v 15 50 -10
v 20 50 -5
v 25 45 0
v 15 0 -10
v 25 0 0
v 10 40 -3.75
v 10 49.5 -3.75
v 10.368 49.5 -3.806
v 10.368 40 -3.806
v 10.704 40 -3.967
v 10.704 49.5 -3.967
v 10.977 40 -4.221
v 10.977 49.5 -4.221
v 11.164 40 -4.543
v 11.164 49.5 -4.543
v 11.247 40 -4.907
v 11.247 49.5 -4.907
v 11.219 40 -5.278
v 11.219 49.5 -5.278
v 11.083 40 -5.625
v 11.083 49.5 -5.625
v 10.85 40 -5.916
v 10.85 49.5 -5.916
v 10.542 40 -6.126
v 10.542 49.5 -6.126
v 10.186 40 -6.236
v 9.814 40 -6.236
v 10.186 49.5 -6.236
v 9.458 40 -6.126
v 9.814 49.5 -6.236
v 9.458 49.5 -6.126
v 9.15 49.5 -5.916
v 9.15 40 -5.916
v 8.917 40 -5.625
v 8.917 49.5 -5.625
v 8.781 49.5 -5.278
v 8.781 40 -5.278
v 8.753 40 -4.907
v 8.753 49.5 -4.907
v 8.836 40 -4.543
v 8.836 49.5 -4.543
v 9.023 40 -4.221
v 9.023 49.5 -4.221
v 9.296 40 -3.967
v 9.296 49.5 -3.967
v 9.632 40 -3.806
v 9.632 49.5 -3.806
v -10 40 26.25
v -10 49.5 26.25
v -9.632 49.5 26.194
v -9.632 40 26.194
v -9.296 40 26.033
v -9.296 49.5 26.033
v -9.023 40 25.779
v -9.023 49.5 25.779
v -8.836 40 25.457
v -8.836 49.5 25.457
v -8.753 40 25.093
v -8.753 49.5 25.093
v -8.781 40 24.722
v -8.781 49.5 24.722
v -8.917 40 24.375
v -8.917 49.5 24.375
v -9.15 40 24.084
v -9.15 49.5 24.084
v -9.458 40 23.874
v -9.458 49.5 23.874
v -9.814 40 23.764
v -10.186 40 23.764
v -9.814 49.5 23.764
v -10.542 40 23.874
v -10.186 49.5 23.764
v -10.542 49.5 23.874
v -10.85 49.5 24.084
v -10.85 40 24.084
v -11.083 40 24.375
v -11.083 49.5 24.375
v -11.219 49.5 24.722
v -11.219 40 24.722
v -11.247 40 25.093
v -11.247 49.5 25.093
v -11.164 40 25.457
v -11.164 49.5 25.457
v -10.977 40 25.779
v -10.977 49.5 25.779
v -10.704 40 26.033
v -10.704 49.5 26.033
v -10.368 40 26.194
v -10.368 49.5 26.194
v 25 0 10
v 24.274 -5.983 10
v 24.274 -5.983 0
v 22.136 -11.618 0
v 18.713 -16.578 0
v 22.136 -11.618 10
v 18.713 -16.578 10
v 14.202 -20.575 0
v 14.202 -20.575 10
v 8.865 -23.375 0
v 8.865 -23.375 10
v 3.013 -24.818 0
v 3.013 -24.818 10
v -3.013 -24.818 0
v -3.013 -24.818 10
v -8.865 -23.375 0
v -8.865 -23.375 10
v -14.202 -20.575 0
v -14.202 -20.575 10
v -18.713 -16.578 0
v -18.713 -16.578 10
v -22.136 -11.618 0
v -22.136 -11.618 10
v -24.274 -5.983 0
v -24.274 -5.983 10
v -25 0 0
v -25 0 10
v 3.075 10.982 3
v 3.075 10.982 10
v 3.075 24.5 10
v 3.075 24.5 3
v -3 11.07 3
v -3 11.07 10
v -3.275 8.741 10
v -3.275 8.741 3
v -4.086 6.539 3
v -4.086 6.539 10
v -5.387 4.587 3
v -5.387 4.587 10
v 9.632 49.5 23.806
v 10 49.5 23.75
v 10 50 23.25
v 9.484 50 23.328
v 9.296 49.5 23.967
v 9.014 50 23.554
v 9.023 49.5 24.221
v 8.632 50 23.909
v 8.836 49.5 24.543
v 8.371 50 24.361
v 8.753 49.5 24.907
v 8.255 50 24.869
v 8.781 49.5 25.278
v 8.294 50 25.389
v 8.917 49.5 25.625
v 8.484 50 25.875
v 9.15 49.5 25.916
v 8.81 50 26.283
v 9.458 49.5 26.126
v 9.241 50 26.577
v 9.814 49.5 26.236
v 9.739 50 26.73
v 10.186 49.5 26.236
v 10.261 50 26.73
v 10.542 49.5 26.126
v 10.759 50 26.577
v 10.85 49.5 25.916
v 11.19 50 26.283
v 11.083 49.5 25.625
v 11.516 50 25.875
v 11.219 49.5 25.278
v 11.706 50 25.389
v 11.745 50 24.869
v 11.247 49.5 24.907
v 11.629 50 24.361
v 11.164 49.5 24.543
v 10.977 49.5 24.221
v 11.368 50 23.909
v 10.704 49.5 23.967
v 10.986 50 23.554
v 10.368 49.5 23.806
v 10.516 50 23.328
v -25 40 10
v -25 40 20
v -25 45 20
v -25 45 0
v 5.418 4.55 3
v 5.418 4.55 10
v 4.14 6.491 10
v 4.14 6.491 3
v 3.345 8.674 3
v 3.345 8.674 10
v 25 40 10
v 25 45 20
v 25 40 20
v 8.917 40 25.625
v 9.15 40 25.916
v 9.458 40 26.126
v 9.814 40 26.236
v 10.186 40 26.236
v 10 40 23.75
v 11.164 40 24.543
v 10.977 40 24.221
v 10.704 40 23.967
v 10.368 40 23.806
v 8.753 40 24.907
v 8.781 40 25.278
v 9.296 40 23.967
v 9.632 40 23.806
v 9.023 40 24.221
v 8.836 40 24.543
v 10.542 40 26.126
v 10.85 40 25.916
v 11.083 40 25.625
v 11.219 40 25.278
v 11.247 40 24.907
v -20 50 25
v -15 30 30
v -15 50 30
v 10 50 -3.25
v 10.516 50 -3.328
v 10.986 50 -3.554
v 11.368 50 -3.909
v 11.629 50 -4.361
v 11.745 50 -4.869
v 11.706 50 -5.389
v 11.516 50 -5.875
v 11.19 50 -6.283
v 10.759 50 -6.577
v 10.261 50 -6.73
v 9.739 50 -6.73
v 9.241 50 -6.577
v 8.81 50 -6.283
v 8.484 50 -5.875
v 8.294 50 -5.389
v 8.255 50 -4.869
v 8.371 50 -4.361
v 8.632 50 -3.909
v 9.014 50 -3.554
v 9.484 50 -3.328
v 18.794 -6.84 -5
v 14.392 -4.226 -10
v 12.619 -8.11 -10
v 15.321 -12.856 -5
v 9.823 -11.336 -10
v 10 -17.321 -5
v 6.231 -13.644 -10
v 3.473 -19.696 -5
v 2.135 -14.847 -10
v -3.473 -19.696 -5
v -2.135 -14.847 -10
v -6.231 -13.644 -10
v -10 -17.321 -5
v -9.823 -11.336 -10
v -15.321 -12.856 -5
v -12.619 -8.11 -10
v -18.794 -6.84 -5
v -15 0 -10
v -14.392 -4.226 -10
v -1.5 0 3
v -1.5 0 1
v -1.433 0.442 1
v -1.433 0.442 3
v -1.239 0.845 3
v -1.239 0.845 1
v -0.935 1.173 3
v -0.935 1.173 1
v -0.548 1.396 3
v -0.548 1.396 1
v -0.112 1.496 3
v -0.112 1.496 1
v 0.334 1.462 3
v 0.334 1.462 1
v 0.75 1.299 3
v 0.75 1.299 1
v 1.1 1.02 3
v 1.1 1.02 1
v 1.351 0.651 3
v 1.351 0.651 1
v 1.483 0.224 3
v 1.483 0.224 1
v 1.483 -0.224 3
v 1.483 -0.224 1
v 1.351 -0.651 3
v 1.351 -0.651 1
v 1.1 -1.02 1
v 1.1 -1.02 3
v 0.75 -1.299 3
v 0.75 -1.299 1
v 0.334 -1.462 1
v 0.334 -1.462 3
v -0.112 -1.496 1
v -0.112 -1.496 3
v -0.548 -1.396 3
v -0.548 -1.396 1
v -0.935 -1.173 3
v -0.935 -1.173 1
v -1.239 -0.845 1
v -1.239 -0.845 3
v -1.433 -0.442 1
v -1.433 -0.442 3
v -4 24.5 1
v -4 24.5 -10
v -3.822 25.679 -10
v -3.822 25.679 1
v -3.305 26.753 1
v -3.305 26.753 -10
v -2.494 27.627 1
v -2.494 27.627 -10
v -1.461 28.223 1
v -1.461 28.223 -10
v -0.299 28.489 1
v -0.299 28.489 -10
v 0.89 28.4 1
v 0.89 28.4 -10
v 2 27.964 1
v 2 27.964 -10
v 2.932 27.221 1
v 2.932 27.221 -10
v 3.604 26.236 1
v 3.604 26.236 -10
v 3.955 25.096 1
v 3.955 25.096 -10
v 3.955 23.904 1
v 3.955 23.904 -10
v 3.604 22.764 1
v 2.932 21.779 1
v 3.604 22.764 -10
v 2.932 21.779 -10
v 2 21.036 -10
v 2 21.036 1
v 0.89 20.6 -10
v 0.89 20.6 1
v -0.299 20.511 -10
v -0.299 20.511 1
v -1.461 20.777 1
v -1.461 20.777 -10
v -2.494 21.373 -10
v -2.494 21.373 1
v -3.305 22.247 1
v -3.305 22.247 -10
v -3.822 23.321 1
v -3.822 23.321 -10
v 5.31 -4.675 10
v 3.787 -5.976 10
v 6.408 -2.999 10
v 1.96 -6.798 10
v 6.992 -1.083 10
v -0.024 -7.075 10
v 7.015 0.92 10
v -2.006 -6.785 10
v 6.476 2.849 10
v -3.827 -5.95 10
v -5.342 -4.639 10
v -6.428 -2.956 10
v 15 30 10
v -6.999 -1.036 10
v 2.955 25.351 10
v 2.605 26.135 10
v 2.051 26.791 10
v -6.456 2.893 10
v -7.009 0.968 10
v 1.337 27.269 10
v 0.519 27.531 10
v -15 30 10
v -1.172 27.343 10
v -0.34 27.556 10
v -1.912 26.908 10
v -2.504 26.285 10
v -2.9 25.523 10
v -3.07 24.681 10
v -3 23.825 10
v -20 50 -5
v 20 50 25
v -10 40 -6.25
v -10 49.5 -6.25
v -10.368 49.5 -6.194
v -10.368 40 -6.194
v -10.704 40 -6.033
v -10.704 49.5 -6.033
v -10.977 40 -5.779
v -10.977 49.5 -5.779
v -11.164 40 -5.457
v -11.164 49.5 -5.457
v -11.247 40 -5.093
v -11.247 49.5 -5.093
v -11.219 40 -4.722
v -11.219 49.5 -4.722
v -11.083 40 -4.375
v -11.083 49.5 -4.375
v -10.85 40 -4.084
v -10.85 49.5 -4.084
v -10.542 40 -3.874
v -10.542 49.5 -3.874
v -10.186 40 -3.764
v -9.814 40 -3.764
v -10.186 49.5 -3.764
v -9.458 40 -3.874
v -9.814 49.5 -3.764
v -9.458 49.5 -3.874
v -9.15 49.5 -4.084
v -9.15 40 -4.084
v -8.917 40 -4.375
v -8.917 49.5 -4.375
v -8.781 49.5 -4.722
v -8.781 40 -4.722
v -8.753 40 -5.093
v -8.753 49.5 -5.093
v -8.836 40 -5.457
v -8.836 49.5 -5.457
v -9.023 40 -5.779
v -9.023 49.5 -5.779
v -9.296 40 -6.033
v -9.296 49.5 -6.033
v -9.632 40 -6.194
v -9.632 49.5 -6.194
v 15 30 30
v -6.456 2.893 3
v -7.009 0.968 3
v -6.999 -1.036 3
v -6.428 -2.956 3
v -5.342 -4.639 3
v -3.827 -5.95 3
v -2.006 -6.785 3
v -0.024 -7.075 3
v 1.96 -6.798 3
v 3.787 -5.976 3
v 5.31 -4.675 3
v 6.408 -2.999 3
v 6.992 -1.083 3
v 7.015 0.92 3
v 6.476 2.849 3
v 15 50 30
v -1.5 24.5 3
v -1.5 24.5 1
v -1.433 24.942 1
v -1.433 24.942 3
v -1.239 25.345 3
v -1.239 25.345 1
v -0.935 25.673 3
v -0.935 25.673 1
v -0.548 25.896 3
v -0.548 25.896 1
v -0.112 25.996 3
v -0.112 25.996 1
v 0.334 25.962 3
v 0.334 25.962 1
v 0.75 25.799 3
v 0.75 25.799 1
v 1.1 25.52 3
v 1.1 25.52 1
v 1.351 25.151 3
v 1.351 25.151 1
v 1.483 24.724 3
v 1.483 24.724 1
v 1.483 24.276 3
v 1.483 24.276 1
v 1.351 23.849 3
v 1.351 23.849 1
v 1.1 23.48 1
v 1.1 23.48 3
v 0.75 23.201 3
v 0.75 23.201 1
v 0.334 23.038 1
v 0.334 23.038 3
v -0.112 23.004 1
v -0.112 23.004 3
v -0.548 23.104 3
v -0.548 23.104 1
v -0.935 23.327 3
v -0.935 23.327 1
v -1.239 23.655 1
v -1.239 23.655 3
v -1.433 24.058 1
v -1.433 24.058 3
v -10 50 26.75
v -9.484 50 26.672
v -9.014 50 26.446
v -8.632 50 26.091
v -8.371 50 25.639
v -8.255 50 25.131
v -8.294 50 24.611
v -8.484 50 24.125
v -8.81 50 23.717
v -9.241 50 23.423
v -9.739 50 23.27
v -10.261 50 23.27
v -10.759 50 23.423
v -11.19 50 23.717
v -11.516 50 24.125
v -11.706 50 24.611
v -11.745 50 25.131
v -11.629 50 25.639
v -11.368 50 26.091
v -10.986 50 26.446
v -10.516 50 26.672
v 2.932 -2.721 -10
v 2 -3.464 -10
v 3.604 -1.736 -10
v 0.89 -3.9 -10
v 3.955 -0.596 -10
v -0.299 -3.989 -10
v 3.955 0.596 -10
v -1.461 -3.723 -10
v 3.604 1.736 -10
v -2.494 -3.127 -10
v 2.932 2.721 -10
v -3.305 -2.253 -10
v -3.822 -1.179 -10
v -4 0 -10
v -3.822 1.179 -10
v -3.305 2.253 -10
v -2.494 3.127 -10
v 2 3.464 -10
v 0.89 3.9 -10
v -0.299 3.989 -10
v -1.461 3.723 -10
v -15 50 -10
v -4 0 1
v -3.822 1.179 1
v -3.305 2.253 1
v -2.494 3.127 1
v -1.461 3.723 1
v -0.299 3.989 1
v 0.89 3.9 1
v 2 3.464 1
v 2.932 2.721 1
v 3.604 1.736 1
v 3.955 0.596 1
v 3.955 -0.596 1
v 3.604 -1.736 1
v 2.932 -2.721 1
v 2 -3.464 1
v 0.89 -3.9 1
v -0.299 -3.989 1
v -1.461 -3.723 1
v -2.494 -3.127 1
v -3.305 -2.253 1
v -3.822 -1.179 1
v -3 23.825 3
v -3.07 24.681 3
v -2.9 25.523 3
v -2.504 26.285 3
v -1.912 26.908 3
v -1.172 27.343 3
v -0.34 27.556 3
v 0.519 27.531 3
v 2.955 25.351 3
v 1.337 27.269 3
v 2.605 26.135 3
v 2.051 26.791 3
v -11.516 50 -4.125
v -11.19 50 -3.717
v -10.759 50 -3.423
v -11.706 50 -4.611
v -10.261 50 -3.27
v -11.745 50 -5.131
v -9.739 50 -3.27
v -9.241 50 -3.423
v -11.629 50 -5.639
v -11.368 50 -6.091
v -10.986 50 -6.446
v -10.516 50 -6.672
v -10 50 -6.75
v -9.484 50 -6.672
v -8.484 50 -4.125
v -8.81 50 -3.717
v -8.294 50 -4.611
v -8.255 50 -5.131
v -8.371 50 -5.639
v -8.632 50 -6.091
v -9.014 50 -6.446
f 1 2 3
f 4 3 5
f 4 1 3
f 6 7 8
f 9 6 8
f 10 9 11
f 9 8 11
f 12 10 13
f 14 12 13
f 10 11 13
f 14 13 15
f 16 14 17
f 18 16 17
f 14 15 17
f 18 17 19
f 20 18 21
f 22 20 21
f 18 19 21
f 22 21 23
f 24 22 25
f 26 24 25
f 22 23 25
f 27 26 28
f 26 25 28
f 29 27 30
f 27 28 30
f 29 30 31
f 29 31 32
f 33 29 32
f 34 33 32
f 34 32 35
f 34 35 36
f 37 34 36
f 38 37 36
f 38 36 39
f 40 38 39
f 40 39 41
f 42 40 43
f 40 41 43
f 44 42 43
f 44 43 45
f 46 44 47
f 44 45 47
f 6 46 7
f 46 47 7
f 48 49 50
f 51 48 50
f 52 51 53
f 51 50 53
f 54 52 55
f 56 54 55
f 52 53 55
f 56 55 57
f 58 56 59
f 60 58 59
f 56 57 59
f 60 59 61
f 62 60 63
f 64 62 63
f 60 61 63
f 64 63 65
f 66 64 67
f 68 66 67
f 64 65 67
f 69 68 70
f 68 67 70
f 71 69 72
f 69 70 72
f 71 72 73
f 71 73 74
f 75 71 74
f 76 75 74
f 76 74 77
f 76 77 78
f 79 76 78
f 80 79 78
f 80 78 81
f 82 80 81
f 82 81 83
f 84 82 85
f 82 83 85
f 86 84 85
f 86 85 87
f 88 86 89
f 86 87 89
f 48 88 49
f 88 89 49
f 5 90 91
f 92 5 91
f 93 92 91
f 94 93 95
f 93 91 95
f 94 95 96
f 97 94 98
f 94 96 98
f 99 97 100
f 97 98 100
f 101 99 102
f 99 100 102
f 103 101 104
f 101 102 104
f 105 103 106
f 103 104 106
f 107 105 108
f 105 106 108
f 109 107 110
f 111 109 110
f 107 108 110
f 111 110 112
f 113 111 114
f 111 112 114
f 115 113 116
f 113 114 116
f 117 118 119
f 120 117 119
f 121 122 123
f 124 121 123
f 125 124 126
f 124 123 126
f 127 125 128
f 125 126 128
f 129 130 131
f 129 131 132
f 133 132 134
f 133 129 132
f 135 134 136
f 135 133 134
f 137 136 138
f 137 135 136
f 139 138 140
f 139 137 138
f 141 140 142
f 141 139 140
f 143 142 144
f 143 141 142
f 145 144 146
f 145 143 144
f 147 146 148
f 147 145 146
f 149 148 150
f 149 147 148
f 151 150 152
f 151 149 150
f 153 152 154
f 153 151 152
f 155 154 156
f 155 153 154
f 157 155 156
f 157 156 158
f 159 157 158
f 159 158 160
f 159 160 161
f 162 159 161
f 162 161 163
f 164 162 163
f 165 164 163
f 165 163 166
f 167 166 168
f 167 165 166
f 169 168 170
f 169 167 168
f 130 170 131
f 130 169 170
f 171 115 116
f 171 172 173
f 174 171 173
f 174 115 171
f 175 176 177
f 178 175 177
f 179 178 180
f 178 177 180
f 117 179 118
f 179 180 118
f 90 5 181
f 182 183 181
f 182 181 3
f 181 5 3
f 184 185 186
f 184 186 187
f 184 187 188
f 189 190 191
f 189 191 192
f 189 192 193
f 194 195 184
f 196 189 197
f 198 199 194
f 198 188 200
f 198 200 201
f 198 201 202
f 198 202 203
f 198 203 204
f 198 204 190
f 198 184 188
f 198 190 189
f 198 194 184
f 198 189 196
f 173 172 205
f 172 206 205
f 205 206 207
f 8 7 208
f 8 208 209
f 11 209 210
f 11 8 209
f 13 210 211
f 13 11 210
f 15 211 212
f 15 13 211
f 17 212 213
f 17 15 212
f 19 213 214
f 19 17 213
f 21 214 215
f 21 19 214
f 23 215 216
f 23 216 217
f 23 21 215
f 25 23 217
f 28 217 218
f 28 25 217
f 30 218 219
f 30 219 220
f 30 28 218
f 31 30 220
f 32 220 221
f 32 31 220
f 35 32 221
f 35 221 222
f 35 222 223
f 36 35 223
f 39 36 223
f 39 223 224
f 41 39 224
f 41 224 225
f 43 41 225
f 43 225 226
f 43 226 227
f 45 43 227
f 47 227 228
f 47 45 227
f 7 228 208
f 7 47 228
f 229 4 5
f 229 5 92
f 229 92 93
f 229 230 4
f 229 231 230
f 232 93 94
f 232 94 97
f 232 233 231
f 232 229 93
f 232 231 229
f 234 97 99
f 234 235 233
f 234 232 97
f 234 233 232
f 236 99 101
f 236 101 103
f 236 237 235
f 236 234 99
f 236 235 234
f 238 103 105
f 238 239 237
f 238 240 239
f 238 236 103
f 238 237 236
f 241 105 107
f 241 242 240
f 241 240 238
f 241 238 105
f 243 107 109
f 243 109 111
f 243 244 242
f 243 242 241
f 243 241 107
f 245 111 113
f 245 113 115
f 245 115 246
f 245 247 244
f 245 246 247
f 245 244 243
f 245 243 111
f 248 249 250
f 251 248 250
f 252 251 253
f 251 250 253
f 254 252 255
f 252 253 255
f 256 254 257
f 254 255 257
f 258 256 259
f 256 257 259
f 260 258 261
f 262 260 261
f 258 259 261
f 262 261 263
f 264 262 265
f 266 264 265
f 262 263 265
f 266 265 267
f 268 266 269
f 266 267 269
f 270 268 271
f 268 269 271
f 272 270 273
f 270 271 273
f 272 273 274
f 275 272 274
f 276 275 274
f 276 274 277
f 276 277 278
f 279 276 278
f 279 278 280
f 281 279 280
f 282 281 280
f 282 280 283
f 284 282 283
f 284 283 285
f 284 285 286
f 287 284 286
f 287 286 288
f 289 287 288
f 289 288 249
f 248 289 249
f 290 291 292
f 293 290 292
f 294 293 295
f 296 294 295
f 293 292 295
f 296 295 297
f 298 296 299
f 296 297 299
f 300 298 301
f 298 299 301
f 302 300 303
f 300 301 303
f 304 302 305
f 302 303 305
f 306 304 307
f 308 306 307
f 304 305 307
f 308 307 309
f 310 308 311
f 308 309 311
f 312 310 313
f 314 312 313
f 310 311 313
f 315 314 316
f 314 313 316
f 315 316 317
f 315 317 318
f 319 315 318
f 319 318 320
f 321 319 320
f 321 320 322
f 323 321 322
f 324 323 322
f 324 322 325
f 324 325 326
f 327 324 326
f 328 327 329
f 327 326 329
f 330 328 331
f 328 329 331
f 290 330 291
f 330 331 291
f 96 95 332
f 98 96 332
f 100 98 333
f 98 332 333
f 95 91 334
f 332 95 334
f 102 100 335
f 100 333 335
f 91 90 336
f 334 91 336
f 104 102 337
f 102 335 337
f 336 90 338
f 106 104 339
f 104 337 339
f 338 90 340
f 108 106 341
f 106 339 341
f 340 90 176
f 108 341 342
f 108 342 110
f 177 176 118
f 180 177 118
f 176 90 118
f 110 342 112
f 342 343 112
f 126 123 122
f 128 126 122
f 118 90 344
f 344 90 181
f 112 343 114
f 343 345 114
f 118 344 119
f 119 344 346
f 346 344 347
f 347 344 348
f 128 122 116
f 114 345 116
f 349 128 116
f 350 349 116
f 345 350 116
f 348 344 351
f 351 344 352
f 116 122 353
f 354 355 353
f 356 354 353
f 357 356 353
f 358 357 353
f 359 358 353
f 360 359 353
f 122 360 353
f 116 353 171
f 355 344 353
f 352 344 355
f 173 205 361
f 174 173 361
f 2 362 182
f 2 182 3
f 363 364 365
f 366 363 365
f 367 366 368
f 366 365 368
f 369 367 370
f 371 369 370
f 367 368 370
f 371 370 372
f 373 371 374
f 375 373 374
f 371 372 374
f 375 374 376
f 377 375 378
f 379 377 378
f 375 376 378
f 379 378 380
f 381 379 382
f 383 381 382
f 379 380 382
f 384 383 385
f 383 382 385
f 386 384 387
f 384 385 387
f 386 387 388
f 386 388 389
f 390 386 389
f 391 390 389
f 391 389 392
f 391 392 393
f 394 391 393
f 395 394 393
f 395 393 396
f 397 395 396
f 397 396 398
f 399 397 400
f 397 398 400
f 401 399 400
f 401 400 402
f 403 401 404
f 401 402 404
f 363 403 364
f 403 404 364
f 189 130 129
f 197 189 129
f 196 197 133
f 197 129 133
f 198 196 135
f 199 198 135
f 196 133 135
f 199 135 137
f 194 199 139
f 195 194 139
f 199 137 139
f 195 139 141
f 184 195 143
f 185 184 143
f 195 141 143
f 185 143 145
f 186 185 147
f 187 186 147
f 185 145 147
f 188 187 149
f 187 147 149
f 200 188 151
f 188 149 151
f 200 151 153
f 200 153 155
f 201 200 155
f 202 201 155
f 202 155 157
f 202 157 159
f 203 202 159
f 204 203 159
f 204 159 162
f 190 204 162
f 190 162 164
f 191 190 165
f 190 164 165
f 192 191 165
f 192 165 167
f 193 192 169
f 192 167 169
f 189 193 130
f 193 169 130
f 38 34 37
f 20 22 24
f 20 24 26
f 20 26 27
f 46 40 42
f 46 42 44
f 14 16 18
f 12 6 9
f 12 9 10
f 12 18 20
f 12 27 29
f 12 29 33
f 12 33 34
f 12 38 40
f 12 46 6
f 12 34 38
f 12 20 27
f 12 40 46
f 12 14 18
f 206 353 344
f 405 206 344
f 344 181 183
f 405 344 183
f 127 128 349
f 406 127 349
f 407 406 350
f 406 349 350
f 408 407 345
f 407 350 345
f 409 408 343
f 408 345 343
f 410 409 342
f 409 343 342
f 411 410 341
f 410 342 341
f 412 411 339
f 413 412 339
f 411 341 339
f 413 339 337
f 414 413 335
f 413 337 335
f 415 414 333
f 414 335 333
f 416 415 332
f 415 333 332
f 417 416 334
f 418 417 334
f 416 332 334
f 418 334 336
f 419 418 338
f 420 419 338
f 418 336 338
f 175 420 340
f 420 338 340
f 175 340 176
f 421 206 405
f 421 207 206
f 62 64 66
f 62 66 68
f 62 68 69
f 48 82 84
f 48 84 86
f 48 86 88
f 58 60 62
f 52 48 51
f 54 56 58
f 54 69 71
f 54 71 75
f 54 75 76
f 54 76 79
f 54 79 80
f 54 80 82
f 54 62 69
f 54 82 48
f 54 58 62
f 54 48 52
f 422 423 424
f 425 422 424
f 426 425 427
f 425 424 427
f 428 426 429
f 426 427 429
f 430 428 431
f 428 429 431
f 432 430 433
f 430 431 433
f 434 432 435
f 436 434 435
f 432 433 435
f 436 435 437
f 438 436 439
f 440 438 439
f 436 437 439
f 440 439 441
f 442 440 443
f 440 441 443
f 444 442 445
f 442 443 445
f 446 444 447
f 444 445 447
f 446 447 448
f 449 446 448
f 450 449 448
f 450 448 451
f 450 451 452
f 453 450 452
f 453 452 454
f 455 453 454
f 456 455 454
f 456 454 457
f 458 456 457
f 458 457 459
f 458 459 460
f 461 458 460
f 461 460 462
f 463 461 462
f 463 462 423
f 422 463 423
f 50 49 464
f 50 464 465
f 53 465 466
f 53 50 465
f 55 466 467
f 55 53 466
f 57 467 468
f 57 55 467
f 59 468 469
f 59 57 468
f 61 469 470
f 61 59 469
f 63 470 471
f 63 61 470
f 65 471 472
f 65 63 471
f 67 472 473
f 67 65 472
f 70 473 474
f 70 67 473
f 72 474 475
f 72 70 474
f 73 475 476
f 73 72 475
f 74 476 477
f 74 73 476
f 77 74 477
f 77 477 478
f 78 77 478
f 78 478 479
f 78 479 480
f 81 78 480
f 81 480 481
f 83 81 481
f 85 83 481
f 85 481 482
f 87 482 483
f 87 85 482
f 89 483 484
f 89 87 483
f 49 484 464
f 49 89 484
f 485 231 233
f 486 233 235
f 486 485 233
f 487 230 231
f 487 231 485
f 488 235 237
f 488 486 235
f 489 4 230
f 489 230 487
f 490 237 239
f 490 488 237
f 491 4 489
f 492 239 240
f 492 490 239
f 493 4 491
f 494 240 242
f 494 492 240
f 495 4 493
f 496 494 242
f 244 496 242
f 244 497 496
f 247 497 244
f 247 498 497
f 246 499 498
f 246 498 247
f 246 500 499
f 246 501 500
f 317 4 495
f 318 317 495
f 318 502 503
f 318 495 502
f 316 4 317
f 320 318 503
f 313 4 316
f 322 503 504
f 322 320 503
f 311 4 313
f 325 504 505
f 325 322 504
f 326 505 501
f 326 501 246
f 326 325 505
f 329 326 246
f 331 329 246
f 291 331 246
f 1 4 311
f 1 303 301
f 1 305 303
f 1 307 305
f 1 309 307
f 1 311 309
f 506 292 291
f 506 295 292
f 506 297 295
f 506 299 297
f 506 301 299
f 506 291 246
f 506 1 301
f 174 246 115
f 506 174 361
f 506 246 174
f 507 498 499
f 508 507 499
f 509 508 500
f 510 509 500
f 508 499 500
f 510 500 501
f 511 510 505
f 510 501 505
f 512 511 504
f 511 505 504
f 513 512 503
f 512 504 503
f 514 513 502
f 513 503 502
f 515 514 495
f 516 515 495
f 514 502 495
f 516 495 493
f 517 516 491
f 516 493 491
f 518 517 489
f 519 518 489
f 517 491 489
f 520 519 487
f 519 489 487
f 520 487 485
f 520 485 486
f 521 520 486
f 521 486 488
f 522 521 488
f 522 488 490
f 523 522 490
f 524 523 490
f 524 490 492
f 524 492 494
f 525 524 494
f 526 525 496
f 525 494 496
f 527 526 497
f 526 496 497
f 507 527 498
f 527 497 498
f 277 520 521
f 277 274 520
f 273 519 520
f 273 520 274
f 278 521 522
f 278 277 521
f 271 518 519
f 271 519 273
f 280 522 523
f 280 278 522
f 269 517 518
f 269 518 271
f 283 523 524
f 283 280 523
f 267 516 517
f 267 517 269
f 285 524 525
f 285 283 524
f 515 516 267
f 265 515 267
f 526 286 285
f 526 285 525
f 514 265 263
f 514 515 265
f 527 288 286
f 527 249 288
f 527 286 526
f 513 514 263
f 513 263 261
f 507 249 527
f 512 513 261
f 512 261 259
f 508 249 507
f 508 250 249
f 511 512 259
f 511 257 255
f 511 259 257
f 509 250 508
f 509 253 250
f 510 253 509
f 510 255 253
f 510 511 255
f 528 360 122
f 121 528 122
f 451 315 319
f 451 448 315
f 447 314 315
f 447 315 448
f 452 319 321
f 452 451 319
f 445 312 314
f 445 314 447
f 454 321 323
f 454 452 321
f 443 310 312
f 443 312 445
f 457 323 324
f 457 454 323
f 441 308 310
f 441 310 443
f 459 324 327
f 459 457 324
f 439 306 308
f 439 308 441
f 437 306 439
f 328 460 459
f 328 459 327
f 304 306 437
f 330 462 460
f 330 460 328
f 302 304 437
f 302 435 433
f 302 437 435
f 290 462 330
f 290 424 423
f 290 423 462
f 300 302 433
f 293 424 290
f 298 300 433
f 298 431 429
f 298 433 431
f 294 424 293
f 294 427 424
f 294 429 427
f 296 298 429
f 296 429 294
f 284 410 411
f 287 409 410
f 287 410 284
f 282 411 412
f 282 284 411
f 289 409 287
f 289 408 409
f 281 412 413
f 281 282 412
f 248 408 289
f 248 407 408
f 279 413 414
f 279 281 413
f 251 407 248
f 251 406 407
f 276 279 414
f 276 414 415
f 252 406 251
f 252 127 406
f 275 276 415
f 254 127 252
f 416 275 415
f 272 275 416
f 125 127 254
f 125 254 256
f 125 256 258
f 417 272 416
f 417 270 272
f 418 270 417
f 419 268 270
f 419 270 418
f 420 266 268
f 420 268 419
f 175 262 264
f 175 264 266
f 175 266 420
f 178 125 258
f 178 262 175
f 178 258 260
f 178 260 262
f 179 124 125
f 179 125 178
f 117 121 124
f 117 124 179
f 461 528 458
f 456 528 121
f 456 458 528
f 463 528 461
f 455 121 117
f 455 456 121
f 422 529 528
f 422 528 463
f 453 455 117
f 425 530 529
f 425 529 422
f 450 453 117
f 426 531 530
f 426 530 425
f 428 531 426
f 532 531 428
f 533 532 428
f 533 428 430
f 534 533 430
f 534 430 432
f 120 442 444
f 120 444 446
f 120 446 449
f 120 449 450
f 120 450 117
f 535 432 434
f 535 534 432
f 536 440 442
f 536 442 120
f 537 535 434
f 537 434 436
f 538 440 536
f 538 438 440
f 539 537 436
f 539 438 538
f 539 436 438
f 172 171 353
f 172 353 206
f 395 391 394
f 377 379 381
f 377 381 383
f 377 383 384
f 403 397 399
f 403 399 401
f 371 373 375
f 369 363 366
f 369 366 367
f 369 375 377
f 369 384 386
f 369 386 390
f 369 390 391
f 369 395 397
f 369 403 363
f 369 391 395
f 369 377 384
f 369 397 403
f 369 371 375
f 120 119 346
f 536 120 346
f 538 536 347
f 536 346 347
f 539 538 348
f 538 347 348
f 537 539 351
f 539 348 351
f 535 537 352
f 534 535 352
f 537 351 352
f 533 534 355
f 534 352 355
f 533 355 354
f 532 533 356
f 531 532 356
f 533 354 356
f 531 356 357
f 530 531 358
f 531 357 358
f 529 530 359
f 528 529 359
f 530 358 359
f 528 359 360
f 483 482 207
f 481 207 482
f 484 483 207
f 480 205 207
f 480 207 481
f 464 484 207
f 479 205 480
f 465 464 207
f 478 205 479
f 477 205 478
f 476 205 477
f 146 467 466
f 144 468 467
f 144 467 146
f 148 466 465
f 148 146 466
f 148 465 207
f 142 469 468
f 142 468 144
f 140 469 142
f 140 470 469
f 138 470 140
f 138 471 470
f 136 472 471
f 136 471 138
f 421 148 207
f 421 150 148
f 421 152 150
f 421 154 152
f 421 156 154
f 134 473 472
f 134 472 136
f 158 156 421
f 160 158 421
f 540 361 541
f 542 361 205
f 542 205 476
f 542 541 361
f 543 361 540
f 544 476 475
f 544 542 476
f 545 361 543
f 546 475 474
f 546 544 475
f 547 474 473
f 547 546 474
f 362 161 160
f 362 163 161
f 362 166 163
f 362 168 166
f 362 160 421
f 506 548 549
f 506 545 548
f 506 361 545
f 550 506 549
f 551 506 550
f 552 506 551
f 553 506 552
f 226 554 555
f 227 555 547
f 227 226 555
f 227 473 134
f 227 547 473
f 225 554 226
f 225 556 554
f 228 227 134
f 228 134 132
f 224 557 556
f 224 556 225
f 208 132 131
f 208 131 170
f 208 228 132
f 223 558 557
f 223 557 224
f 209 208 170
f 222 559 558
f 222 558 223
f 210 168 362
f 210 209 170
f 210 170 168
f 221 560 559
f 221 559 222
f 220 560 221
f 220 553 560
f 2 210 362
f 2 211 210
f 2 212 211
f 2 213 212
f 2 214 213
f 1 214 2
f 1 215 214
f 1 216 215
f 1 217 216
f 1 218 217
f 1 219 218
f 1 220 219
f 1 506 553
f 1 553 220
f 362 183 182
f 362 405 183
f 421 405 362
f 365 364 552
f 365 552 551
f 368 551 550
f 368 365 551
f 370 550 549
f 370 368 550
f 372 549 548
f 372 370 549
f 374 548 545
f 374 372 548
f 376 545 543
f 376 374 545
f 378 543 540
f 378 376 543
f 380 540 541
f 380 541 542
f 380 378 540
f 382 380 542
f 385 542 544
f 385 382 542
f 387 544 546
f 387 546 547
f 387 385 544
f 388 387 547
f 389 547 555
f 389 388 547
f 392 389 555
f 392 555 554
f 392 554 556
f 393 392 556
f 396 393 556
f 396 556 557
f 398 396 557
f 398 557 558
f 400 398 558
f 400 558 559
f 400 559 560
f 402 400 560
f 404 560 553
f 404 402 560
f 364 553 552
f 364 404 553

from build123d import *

# Parameters (mm, degrees)
BOSS_EXTRUDE1_DEPTH = 10
CHAMFER1_SIZE       = 10
CUT_EXTRUDE3_DEPTH  = 7
SKETCH7_R           = 4
CUT_EXTRUDE4_DEPTH  = 11
SKETCH8_R           = 1.5
CUT_EXTRUDE5_DEPTH  = 11
SKETCH9_W           = 50
SKETCH9_H           = 20
BOSS_EXTRUDE2_DEPTH = 20
CHAMFER2_SIZE       = 10
CHAMFER3_SIZE       = 5
SKETCH10_R          = 1.25
CUT_EXTRUDE6_DEPTH  = 10
CHAMFER4_SIZE       = 0.5


with BuildPart() as part:
    # Sketch1 → Boss-Extrude1 (new, symmetric)
    with BuildSketch(Plane.XY):
        with BuildLine():
            Line((25, 50), (25, 0))
            ThreePointArc((25, 0), (0, -25), (-25, 0))
            Line((-25, 0), (-25, 50))
            Line((-25, 50), (25, 50))
        make_face()
    extrude(amount=BOSS_EXTRUDE1_DEPTH, both=True)

    # Chamfer1
    chamfer1_edges = [part.edges().sort_by_distance(p)[0] for p in [
        (25, 25, -10),
        (0, -25, -10),
        (-25, 25, -10),
    ]]
    chamfer(chamfer1_edges, length=CHAMFER1_SIZE)

    # Sketch6 → Cut-Extrude3 (cut)
    with BuildSketch(Plane.XY.offset(10)):
        with BuildLine():
            Line((3.075, 10.981803131), (3.075, 24.5))
            ThreePointArc((3.075, 24.5), (-0.339576943, 27.556192484), (-3, 23.825))
            Line((-3, 23.825), (-3, 11.070484407))
            ThreePointArc((-3, 11.070484407), (-3.615579404, 7.616117595), (-5.386530015, 4.587038195))
            ThreePointArc((-5.386530015, 4.587038195), (-0.02406199, -7.074959083), (5.417606149, 4.550293244))
            ThreePointArc((5.417606149, 4.550293244), (3.678885417, 7.559372599), (3.075, 10.981803131))
        make_face()
    extrude(amount=-CUT_EXTRUDE3_DEPTH, mode=Mode.SUBTRACT)

    # Sketch7 → Cut-Extrude4 (cut)
    with BuildSketch(Plane(origin=(0, 0, -10), x_dir=(-1, 0, 0), z_dir=(0, 0, -1))):
        Circle(SKETCH7_R)
        with Locations((0, 24.5)):
            Circle(SKETCH7_R)
    extrude(amount=-CUT_EXTRUDE4_DEPTH, mode=Mode.SUBTRACT)

    # Sketch8 → Cut-Extrude5 (cut)
    with BuildSketch(Plane(origin=(0, 0, 1), x_dir=(-1, 0, 0), z_dir=(0, 0, -1))):
        with Locations((0, 24.5)):
            Circle(SKETCH8_R)
        Circle(SKETCH8_R)
    extrude(amount=-CUT_EXTRUDE5_DEPTH, mode=Mode.SUBTRACT)

    # Sketch9 → Boss-Extrude2 (add)
    with BuildSketch(Plane.XY.offset(10)):
        with Locations((0, 40)):
            Rectangle(SKETCH9_W, SKETCH9_H)
    extrude(amount=BOSS_EXTRUDE2_DEPTH)

    # Chamfer2
    chamfer2_edges = [part.edges().sort_by_distance(p)[0] for p in [
        (25, 30, 20),
        (-25, 30, 20),
        (25, 40, 30),
        (-25, 40, 30),
    ]]
    chamfer(chamfer2_edges, length=CHAMFER2_SIZE)

    # Chamfer3
    chamfer3_edges = [part.edges().sort_by_distance(p)[0] for p in [
        (-25, 50, 10),
        (25, 50, 10),
    ]]
    chamfer(chamfer3_edges, length=CHAMFER3_SIZE)

    # Sketch10 → Cut-Extrude6 (cut)
    with BuildSketch(Plane(origin=(0, 50, 0), x_dir=(1, 0, 0), z_dir=(0, 1, 0))):
        with Locations(Location((10, 5, 0), (0, 0, 270))):
            Circle(SKETCH10_R)
        with Locations(Location((10, -25, 0), (0, 0, 90))):
            Circle(SKETCH10_R)
        with Locations(Location((-10, -25, 0), (0, 0, 270))):
            Circle(SKETCH10_R)
        with Locations(Location((-10, 5, 0), (0, 0, 90))):
            Circle(SKETCH10_R)
    extrude(amount=-CUT_EXTRUDE6_DEPTH, mode=Mode.SUBTRACT)

    # Chamfer4
    chamfer4_edges = [part.edges().sort_by_distance(p)[0] for p in [
        (-10, 50, -3.75),
        (-10, 50, 23.75),
        (10, 50, 26.25),
        (10, 50, -6.25),
    ]]
    chamfer(chamfer4_edges, length=CHAMFER4_SIZE)


solid = part.part
